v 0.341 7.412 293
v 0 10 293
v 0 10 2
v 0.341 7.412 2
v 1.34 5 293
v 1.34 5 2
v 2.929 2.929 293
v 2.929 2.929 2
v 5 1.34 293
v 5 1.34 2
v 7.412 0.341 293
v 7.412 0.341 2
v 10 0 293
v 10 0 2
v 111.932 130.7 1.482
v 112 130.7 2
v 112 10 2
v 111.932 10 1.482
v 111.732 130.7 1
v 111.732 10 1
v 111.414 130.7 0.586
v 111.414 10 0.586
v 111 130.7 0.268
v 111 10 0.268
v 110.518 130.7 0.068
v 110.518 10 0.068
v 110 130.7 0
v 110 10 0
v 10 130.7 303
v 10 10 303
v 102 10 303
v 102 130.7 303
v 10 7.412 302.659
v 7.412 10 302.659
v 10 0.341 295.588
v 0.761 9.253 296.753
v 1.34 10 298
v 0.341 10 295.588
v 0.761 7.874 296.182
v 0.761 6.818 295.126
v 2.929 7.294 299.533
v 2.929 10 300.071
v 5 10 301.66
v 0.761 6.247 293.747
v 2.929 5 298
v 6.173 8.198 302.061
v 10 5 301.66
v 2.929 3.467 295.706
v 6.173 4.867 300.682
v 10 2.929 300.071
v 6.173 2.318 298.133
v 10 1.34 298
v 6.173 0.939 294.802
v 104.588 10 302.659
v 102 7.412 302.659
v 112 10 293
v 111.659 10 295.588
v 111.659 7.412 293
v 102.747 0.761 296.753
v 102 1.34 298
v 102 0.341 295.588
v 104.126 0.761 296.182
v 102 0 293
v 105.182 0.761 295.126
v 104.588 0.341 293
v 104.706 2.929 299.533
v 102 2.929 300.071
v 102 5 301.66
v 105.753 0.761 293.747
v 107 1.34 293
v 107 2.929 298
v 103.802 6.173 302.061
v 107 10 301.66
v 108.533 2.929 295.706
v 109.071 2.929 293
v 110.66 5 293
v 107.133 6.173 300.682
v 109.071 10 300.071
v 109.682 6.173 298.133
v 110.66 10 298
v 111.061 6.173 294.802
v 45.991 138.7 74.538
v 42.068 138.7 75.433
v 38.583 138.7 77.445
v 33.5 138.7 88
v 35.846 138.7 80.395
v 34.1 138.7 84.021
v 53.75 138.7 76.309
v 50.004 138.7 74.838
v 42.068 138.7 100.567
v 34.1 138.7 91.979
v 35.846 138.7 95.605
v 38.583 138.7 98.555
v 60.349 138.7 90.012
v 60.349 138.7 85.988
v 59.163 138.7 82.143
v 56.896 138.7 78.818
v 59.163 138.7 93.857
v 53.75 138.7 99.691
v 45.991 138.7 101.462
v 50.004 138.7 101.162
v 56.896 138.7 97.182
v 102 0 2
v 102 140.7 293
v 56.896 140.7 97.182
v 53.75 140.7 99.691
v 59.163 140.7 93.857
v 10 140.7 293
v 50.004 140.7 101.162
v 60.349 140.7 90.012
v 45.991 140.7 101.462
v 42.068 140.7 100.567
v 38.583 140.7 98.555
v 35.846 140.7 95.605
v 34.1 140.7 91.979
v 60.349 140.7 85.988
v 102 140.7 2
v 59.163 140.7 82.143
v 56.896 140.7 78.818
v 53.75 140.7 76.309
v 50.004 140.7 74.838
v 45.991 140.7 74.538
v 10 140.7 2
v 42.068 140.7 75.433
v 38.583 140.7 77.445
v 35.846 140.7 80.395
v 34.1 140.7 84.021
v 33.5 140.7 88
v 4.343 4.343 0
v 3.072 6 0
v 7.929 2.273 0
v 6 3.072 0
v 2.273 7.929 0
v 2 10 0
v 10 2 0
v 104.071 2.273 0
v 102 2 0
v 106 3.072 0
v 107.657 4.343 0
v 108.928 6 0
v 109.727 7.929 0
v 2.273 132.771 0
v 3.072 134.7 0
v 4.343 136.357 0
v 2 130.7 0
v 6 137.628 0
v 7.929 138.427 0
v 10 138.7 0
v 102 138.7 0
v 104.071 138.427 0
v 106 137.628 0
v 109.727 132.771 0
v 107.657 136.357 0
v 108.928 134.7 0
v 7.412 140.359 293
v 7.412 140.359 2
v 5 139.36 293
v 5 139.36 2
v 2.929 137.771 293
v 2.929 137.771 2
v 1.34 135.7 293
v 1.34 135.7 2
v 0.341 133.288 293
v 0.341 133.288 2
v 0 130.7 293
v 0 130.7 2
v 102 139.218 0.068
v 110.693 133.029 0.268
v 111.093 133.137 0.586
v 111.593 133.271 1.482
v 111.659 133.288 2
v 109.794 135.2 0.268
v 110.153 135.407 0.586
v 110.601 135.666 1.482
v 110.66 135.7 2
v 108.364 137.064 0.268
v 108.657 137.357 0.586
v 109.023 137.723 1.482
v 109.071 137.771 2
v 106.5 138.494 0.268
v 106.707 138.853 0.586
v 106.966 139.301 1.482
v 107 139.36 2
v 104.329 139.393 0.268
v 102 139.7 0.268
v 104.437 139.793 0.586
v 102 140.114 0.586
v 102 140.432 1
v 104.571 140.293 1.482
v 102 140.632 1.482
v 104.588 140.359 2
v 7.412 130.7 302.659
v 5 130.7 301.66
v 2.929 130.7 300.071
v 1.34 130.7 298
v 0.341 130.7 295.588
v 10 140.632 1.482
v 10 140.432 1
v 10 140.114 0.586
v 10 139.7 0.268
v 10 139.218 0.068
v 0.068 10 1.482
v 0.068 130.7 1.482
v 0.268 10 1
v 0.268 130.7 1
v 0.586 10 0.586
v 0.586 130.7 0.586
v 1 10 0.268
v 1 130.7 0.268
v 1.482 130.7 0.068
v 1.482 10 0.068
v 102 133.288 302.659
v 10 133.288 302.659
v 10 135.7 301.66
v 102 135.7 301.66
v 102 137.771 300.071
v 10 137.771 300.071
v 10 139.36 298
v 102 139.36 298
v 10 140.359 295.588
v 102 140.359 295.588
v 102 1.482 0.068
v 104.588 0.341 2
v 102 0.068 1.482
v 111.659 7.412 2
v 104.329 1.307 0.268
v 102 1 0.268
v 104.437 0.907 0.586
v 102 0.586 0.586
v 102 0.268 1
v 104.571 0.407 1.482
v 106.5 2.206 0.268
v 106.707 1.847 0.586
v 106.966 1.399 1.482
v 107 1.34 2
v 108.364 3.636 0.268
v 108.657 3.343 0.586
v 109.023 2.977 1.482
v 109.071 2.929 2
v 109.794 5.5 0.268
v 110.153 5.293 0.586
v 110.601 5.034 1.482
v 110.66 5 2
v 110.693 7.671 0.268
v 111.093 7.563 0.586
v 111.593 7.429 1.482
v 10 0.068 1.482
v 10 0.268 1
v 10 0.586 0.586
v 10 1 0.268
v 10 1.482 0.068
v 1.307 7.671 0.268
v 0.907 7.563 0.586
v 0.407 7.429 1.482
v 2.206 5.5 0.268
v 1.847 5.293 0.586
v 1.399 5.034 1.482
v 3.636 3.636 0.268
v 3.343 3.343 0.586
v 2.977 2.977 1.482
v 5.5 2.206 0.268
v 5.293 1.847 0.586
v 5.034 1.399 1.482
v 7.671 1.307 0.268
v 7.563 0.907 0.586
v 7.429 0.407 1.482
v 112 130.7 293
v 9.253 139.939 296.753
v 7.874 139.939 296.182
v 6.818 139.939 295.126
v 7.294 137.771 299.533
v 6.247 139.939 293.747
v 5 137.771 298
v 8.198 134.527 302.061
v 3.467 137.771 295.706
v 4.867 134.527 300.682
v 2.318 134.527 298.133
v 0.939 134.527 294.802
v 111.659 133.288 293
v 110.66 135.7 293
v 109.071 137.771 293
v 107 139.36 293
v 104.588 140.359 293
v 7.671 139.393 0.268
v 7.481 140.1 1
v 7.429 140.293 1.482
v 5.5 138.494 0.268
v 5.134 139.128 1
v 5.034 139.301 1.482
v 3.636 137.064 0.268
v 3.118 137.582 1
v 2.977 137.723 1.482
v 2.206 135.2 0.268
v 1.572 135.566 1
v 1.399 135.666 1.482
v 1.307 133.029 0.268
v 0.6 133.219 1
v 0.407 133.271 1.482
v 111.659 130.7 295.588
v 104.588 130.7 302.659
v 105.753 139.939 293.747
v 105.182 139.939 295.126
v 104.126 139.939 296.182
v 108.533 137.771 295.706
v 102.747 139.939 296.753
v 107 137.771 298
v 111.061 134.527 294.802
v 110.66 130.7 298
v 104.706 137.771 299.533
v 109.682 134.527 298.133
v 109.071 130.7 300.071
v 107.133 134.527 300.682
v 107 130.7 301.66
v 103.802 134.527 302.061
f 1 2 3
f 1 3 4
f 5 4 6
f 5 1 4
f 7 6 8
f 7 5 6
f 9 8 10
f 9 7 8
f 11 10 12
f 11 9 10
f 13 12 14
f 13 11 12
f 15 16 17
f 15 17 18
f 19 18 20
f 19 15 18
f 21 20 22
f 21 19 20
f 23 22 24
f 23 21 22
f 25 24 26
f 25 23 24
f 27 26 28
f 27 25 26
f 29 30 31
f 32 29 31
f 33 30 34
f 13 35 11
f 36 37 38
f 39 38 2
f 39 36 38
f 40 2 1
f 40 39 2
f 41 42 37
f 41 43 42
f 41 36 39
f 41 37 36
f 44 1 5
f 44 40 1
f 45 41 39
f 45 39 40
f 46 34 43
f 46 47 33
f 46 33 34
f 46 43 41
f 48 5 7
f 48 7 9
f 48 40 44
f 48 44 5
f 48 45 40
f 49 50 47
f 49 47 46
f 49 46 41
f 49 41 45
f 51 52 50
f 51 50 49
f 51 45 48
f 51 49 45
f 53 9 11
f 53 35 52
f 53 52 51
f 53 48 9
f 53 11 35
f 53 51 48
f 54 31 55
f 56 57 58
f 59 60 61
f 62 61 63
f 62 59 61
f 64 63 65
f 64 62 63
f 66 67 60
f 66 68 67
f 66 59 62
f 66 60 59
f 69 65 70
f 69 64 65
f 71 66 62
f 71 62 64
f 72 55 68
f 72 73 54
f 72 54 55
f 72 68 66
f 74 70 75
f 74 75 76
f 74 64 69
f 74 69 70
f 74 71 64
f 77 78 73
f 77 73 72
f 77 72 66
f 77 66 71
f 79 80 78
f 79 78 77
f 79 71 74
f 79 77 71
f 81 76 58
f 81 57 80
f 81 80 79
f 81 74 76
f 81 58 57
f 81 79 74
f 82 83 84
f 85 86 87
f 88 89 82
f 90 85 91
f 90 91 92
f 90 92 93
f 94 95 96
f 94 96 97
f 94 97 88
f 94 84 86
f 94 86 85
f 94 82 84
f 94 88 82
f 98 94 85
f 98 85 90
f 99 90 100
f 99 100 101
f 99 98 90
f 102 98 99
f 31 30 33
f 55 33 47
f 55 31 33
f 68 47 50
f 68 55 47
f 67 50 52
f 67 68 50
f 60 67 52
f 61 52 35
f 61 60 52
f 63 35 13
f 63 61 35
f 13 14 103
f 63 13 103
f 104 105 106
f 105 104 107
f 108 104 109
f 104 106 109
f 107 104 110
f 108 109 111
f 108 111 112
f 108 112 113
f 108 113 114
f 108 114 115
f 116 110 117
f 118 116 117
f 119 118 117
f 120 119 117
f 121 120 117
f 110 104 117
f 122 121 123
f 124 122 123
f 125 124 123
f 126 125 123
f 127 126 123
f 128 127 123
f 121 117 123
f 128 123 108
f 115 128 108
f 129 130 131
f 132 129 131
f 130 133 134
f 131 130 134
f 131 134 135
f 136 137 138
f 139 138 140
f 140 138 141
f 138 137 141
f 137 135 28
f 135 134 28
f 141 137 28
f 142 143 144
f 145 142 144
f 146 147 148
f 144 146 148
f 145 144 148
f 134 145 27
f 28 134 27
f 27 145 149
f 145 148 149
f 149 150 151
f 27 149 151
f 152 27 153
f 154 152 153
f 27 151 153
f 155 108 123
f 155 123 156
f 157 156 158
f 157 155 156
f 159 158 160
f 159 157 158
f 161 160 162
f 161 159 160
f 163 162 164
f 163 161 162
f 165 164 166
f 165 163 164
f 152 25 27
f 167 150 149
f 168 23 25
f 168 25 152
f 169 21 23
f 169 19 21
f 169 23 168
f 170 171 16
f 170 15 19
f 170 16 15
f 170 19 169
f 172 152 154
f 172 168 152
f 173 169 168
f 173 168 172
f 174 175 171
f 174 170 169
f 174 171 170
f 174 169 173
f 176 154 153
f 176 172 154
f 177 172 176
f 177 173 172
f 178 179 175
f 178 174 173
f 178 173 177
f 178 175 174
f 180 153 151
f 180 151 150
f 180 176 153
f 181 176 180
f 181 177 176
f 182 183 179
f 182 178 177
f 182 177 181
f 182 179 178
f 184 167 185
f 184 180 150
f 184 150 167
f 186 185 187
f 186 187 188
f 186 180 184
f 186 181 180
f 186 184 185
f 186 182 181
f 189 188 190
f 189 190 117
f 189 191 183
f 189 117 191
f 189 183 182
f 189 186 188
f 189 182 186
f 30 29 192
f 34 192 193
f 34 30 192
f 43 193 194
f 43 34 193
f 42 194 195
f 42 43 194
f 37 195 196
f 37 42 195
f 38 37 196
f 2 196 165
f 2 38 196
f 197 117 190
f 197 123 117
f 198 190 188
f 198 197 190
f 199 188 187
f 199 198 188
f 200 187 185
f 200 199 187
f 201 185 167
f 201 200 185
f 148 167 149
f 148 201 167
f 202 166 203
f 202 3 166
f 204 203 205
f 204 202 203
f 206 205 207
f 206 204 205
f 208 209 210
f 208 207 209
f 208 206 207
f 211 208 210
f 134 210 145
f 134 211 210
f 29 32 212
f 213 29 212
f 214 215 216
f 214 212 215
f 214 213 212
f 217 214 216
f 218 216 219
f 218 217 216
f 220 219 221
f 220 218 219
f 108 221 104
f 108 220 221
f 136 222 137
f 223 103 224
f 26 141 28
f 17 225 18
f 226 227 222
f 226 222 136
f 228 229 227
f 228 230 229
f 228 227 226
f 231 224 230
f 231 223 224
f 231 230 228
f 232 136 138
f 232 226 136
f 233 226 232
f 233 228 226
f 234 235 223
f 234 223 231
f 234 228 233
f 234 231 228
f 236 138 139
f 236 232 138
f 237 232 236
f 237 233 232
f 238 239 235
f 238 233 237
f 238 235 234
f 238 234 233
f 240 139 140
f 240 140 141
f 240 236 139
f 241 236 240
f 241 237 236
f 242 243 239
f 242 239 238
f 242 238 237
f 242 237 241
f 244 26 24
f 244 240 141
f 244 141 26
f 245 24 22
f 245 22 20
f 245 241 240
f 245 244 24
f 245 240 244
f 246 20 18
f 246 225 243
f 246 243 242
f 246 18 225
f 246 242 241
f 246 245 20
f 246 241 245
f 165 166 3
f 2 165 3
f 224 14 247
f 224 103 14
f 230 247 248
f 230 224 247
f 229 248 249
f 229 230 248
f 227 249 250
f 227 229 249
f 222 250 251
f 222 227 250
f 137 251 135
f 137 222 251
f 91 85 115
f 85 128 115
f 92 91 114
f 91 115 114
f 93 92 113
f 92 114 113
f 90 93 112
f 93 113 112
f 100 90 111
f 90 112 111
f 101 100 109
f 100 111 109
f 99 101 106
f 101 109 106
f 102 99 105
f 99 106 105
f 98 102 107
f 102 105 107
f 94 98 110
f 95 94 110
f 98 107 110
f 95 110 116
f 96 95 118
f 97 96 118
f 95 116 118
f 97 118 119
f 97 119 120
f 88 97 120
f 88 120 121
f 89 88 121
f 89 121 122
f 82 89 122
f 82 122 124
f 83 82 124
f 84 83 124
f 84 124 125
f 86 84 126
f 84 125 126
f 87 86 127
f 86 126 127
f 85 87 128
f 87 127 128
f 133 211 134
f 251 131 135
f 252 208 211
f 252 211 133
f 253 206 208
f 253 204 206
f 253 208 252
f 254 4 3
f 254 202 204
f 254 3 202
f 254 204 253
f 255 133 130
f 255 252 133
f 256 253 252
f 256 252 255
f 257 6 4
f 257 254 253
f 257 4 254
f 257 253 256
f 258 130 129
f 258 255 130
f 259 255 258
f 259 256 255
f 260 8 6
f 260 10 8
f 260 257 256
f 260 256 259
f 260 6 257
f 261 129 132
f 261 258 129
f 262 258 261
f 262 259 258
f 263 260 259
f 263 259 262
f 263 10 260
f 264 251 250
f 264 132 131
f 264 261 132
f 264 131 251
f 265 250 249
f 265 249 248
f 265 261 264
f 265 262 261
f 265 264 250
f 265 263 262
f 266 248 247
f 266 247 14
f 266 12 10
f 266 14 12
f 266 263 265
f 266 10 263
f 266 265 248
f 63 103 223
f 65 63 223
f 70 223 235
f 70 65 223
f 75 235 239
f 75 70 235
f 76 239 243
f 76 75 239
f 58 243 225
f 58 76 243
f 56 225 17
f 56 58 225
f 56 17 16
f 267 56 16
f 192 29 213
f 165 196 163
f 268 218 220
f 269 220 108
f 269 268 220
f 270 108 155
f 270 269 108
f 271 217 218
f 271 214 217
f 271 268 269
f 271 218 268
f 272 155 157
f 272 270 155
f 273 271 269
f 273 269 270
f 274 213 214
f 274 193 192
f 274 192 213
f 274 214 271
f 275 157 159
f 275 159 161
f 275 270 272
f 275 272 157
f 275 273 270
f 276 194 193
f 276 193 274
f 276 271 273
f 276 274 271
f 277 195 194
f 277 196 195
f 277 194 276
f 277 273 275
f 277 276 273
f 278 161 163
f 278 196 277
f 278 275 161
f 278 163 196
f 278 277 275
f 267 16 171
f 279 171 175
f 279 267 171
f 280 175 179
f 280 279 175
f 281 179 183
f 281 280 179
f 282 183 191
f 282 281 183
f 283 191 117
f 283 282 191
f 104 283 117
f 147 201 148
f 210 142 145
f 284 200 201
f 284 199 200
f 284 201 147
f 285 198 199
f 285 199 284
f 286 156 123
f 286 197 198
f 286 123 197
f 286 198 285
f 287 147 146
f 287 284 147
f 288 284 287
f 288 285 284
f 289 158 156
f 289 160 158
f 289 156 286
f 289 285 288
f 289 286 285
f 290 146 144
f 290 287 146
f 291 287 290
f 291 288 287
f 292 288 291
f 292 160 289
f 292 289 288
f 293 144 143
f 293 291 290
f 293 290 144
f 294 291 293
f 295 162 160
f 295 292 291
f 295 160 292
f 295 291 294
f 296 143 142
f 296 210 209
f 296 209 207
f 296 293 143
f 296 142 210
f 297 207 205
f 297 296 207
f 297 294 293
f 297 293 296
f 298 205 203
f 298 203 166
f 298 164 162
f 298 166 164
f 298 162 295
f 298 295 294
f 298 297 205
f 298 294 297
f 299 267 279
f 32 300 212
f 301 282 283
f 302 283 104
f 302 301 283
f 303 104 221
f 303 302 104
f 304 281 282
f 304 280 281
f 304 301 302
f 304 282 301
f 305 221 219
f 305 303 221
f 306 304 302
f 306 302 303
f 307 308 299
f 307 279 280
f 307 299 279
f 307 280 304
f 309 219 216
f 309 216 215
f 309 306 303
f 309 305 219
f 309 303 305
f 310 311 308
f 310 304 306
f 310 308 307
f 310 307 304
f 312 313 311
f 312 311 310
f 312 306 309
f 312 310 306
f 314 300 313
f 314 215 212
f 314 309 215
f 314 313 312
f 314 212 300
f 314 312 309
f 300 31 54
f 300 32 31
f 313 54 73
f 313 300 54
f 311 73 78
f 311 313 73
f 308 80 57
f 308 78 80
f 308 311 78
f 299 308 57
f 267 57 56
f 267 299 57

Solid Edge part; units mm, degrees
sketch "Sketch1" plane through (0, 0, 0) normal (0, 0, 1) x (1, 0, 0)
  line L0 (112, 0) -> (112, 140.7)
  line L1 (112, 140.7) -> (0, 140.7)
  line L2 (0, 140.7) -> (0, 0)
  line L3 (0, 0) -> (112, 0)
extrude "Protrusion1" add sketch "Sketch1" along normal blind 303
fillet "Round_3" radius 10 8 edges at (112, 70.35, 303) (112, 0, 151.5) (56, 0, 303) (0, 0, 151.5) (0, 70.35, 303) (56, 140.7, 303) (0, 140.7, 151.5) (112, 140.7, 151.5)
fillet "Round_4" radius 2 7 edges at (0, 70.35, 0) (2.9289, 137.7711, 0) (56, 140.7, 0) (112, 70.35, 0) (109.0711, 2.9289, 0) (56, 0, 0) (2.9289, 2.9289, 0)
sketch "Sketch2" plane through (56, 140.7, 147.5) normal (0, 1, 0) x (-1, 0, 0)
  circle A0 centre (9, -59.5) radius 13.5
  dimension "D1" = 86
  dimension "D2" = 65
extrude "hole" cut sketch "Sketch2" along normal mid plane 4
